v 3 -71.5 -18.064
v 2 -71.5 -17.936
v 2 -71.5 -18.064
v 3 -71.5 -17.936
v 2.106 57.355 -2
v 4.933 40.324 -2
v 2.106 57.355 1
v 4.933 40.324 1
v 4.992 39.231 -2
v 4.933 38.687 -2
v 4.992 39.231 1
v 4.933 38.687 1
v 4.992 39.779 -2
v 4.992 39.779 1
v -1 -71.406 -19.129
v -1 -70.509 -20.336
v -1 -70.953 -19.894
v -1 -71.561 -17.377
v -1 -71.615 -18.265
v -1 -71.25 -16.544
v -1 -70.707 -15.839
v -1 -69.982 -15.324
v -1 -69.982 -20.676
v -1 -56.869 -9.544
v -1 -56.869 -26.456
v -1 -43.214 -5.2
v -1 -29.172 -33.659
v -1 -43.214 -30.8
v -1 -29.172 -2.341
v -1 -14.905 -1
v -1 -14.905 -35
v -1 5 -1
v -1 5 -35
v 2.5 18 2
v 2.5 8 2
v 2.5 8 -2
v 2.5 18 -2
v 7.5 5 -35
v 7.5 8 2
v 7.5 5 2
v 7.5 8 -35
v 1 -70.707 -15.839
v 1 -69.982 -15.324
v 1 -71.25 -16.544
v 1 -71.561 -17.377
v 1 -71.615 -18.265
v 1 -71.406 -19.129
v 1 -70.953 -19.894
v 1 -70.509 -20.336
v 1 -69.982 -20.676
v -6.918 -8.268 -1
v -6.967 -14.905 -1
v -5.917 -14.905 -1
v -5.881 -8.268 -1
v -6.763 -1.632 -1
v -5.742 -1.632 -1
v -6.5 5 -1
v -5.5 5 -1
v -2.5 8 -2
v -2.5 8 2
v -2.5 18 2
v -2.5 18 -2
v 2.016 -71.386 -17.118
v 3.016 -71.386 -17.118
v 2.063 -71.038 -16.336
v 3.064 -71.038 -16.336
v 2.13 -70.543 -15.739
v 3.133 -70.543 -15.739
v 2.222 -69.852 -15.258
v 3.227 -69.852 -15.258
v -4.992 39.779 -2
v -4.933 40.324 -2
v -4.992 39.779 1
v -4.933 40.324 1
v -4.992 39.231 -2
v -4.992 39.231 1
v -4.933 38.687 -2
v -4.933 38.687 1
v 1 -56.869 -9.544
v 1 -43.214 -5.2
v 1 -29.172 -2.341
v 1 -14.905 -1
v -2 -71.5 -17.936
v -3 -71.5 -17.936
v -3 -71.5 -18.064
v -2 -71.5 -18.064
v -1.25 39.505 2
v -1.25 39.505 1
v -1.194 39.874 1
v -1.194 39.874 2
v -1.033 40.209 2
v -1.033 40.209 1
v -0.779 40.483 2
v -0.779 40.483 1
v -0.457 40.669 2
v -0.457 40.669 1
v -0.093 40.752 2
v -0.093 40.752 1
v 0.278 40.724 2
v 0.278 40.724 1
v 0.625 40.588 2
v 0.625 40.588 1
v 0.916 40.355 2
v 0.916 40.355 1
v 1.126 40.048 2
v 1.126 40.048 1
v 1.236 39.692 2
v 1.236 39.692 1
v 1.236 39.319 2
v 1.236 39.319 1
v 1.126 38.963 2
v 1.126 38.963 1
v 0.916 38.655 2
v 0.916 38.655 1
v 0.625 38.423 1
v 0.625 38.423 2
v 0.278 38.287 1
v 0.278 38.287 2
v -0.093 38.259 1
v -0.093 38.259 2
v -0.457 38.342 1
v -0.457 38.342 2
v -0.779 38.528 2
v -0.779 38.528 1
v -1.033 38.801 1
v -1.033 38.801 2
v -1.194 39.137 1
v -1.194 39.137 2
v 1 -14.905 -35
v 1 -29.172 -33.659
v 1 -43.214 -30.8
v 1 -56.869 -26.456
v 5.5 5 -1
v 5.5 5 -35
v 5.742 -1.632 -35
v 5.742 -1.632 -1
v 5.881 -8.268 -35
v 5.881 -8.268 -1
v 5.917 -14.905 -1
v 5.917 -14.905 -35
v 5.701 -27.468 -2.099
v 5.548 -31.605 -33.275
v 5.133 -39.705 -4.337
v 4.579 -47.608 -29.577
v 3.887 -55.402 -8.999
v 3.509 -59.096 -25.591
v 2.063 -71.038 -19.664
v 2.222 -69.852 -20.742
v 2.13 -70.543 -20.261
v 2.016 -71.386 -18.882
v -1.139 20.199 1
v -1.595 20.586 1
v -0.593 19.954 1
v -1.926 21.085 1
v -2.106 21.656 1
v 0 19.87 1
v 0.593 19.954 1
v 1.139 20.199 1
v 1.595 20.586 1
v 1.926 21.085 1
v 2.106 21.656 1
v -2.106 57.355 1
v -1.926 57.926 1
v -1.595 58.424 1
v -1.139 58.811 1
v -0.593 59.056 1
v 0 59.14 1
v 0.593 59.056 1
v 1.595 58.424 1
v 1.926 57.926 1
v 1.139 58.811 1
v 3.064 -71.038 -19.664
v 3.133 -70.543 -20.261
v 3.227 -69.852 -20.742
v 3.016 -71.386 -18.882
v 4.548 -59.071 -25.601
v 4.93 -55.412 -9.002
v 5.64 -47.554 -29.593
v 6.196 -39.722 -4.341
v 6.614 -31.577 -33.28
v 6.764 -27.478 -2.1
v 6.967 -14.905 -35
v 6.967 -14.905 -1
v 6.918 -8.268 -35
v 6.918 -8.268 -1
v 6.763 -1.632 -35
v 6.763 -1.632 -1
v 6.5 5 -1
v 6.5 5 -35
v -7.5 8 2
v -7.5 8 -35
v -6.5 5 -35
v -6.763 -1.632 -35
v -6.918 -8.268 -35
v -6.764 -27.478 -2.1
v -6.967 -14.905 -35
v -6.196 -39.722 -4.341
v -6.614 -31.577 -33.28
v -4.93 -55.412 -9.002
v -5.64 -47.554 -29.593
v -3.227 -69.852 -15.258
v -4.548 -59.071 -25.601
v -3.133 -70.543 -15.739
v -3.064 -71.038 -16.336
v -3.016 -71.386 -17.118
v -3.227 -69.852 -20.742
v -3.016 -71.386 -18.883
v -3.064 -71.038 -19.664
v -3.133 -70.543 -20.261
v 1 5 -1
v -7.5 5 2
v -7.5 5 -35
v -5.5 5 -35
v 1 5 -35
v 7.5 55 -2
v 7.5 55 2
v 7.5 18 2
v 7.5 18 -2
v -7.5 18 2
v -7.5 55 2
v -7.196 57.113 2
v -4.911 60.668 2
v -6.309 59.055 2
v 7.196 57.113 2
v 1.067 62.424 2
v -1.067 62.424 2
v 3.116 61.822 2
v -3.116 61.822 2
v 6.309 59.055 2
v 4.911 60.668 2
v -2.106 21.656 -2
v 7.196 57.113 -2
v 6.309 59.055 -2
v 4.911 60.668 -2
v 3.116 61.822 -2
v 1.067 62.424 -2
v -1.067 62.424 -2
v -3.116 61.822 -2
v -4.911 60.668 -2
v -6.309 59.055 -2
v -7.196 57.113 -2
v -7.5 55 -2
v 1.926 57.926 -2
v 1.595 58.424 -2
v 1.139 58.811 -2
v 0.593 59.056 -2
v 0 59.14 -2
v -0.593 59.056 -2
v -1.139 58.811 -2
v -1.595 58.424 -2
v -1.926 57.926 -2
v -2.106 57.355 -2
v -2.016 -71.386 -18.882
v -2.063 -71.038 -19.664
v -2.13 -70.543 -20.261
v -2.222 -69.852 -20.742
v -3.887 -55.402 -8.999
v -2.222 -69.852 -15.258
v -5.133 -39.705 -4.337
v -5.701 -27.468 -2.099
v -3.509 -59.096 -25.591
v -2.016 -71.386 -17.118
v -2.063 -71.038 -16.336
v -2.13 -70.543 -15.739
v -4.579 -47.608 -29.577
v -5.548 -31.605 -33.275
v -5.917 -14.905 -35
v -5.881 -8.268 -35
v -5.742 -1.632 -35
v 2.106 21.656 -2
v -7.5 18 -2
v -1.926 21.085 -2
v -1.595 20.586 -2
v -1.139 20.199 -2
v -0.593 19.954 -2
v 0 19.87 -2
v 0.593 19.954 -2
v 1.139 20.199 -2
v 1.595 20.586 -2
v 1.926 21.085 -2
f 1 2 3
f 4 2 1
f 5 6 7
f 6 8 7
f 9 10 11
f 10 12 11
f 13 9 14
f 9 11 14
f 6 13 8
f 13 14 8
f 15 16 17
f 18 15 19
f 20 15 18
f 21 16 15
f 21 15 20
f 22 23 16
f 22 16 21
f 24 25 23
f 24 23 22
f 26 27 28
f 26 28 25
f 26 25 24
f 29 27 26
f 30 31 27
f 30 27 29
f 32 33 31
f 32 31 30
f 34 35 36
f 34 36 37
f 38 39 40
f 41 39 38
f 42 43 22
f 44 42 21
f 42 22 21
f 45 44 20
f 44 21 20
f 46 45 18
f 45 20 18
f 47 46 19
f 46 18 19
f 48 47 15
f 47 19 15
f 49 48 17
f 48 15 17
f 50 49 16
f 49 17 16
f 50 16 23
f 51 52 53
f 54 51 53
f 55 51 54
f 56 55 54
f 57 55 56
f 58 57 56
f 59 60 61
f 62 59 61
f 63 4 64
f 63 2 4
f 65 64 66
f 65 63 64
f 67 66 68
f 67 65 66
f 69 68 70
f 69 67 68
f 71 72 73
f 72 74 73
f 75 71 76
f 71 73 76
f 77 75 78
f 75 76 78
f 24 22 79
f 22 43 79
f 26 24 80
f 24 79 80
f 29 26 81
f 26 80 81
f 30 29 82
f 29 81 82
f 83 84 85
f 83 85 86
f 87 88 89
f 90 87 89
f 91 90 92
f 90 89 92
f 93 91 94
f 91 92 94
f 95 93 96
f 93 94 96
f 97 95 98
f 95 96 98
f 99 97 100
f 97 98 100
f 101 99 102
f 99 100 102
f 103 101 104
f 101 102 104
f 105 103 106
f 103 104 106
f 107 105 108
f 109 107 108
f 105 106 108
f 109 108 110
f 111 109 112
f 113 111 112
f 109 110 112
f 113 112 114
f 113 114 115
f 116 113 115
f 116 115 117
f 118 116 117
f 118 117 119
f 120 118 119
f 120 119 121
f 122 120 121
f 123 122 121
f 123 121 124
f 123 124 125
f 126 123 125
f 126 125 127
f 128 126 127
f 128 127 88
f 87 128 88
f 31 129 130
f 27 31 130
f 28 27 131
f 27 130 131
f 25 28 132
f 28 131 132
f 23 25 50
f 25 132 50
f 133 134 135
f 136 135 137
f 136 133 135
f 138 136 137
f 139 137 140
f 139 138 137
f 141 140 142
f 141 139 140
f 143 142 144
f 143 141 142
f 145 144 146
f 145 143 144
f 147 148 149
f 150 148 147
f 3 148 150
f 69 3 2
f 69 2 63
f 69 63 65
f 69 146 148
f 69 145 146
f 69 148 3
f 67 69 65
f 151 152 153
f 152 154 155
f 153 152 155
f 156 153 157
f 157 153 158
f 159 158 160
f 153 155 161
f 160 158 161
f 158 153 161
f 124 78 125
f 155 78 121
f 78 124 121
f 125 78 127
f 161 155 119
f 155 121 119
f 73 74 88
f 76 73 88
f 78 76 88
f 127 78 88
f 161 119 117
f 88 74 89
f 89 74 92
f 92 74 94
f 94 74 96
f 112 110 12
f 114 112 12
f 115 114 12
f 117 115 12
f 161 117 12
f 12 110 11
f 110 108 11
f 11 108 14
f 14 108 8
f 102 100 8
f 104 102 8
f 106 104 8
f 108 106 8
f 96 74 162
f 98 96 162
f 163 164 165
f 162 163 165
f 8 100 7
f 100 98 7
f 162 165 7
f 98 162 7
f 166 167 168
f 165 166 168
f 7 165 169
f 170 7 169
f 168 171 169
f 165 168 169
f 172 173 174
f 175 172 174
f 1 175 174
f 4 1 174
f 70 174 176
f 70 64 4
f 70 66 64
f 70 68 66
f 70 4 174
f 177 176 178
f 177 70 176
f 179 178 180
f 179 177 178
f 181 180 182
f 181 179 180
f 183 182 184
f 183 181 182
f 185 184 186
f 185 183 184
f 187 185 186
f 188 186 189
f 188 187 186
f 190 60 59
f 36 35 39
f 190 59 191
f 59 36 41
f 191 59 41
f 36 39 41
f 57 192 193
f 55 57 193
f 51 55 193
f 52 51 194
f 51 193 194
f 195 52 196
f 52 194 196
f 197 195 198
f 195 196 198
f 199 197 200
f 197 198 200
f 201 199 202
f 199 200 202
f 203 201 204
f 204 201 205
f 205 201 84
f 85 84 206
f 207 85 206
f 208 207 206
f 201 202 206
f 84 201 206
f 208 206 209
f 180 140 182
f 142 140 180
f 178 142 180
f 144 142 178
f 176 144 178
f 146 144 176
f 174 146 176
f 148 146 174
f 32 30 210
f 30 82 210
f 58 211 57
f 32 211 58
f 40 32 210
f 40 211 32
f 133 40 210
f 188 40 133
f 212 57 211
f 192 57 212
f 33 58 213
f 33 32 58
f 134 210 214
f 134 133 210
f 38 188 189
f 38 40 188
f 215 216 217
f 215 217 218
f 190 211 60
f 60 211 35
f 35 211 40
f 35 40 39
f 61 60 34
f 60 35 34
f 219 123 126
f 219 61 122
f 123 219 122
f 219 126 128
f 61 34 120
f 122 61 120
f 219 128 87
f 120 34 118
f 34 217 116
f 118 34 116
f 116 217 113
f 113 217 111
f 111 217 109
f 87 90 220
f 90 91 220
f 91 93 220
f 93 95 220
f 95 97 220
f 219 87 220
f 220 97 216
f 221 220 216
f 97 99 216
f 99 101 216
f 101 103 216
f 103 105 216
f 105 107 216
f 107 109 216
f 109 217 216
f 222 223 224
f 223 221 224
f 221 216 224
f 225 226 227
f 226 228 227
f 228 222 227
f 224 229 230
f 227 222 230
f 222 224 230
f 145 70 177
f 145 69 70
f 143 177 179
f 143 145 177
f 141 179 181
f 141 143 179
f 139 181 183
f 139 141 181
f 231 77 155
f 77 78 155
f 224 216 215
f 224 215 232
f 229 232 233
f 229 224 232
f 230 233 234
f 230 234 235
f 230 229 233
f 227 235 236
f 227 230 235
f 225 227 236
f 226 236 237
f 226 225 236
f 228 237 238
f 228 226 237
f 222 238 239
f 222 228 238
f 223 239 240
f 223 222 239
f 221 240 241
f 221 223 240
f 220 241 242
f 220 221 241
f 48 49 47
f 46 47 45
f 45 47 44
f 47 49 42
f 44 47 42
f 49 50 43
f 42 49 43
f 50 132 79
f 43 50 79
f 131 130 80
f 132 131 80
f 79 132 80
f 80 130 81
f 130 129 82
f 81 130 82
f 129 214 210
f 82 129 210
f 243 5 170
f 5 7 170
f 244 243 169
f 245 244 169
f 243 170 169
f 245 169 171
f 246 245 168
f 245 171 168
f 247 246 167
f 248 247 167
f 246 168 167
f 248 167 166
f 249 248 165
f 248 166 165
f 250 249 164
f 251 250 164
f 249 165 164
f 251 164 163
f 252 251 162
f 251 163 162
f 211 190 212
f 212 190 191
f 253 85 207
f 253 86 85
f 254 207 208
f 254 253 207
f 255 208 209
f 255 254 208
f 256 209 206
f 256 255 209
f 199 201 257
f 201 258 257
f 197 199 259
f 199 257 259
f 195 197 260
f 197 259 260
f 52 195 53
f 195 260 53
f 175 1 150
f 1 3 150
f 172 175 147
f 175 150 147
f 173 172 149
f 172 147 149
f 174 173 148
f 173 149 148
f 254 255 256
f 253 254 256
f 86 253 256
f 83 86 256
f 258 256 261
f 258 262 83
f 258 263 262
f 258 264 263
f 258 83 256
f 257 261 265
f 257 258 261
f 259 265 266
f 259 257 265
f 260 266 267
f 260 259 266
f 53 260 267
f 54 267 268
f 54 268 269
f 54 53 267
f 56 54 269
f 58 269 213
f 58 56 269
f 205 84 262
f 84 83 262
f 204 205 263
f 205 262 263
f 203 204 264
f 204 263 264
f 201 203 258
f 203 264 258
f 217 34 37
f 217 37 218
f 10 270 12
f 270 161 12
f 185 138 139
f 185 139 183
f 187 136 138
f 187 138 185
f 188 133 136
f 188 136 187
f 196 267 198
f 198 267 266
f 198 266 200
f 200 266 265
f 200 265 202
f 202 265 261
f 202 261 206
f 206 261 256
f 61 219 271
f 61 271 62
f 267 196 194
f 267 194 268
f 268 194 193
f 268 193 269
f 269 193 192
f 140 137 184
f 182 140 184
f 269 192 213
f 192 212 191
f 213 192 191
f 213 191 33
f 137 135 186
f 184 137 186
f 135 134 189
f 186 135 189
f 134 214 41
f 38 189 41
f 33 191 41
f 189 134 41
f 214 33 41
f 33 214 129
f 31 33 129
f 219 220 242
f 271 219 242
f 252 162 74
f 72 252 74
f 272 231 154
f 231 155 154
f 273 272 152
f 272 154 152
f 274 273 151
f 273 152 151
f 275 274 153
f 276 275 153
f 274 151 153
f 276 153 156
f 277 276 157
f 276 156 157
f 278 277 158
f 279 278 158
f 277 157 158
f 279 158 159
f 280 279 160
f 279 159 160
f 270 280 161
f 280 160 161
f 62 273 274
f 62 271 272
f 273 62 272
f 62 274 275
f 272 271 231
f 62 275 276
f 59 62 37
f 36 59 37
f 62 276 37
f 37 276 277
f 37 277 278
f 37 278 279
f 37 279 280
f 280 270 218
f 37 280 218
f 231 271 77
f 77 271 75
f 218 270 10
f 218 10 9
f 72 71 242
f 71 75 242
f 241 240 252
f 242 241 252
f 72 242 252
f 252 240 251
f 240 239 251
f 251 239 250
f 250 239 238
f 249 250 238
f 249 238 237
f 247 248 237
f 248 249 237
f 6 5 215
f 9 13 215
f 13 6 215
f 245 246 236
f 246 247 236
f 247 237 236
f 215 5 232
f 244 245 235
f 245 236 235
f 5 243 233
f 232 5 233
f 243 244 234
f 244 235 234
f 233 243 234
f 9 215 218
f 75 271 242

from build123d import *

# Parameters (mm, degrees)
EXTRUDE_1_DEPTH          = 2
EXTRUDE_1_DEPTH_BACK     = 2
EXTRUDE_2_DEPTH          = 7.5
EXTRUDE_2_DEPTH_BACK     = 7.5
SKETCH_6_W               = 37
SKETCH_6_H               = 3
EXTRUDE_4_DEPTH          = 1
EXTRUDE_4_DEPTH_BACK     = 1
FILLET_1_R               = 3
EXTRUDE_8_DEPTH          = 17
EXTRUDE_8_DEPTH_BACK     = 17
CUT_EXTRUDE_3_DEPTH      = 17.5
CUT_EXTRUDE_3_DEPTH_BACK = 17.5
FILLET_7_R               = 3
FILLET_8_R               = 3
FILLET_9_R               = 3
FILLET_10_R              = 3
SKETCH_21_W              = 5
SKETCH_21_H              = 10
CUT_EXTRUDE_4_DEPTH      = 4
CUT_EXTRUDE_5_DEPTH      = 1
CUT_EXTRUDE_5_DEPTH_BACK = 2
SKETCH_23_R              = 1.25
CUT_EXTRUDE_6_DEPTH      = 13


with BuildPart() as part:
    # 草圖1 → 填料-伸長1 (new, two sides: drawn at the far end of the back side and taken through both)
    with BuildSketch(Plane.XY.offset(-EXTRUDE_1_DEPTH_BACK)):
        with BuildLine():
            Line((7.5, 8), (7.5, 55))
            ThreePointArc((7.5, 55), (0, 62.5), (-7.5, 55))
            Line((-7.5, 55), (-7.5, 8))
            Line((-7.5, 8), (7.5, 8))
        make_face()
    extrude(amount=EXTRUDE_1_DEPTH + EXTRUDE_1_DEPTH_BACK)

    # 草圖6 → 填料-伸長2 (add, two sides: drawn at the far end of the back side and taken through both)
    with BuildSketch(Plane(origin=(0, 0, 0), x_dir=(0, 0, -1), z_dir=(1, 0, 0)).offset(-EXTRUDE_2_DEPTH_BACK)):
        with Locations((16.5, 6.5)):
            Rectangle(SKETCH_6_W, SKETCH_6_H)
    extrude(amount=EXTRUDE_2_DEPTH + EXTRUDE_2_DEPTH_BACK)

    # 草圖8 → 填料-伸長4 (add, two sides: drawn at the far end of the back side and taken through both)
    with BuildSketch(Plane(origin=(0, 0, 0), x_dir=(0, 0, -1), z_dir=(1, 0, 0)).offset(-EXTRUDE_4_DEPTH_BACK)):
        with BuildLine():
            Line((1, 5), (35, 5))
            Line((35, 5), (35, -14.904717451))
            ThreePointArc((35, -14.904717451), (30.055498448, -45.958152709), (18, -75))
            ThreePointArc((18, -75), (5.944501552, -45.958152709), (1, -14.904717451))
            Line((1, -14.904717451), (1, 5))
        make_face()
    extrude(amount=EXTRUDE_4_DEPTH + EXTRUDE_4_DEPTH_BACK)

    # 圓角1
    fillet_1_edges = [part.edges().sort_by_distance(p)[0] for p in [
        (0, -75, -18),
    ]]
    fillet(fillet_1_edges, radius=FILLET_1_R)

    # 草圖19 → 填料-伸長8 (add, two sides: drawn at the far end of the back side and taken through both)
    with BuildSketch(Plane.XY.offset(-18).offset(-EXTRUDE_8_DEPTH_BACK)):
        with BuildLine():
            Line((6.5, 5), (5.5, 5))
            ThreePointArc((5.5, 5), (5.47282517, -33.328822067), (2, -71.5))
            Line((2, -71.5), (3, -71.5))
            ThreePointArc((3, -71.5), (6.537897336, -33.331799225), (6.5, 5))
        make_face()
        with BuildLine():
            Line((-3, -71.5), (-2, -71.5))
            ThreePointArc((-2, -71.5), (-5.47282517, -33.328822067), (-5.5, 5))
            Line((-5.5, 5), (-6.5, 5))
            ThreePointArc((-6.5, 5), (-6.537897336, -33.331799225), (-3, -71.5))
        make_face()
    extrude(amount=EXTRUDE_8_DEPTH + EXTRUDE_8_DEPTH_BACK)

    # 草圖20 → 除料-伸長3 (cut, two sides: drawn at the far end of the back side and taken through both)
    with BuildSketch(Plane(origin=(0, 0, 0), x_dir=(0, 0, -1), z_dir=(1, 0, 0)).offset(-CUT_EXTRUDE_3_DEPTH_BACK)):
        with BuildLine():
            Line((1, -14.904717451), (1, -76.940462962))
            Line((1, -76.940462962), (35, -76.940462962))
            Line((35, -76.940462962), (35, -14.904717451))
            ThreePointArc((35, -14.904717451), (30.055498448, -45.958152709), (18, -75))
            ThreePointArc((18, -75), (5.944501552, -45.958152709), (1, -14.904717451))
        make_face()
    extrude(amount=CUT_EXTRUDE_3_DEPTH + CUT_EXTRUDE_3_DEPTH_BACK, mode=Mode.SUBTRACT)

    # 圓角7
    fillet_7_edges = [part.edges().sort_by_distance(p)[0] for p in [
        (2.5, -71.5, -16.104414556),
    ]]
    fillet(fillet_7_edges, radius=FILLET_7_R)

    # 圓角8
    fillet_8_edges = [part.edges().sort_by_distance(p)[0] for p in [
        (2.5, -71.5, -19.895585444),
    ]]
    fillet(fillet_8_edges, radius=FILLET_8_R)

    # 圓角9
    fillet_9_edges = [part.edges().sort_by_distance(p)[0] for p in [
        (-2.5, -71.5, -16.104414556),
    ]]
    fillet(fillet_9_edges, radius=FILLET_9_R)

    # 圓角10
    fillet_10_edges = [part.edges().sort_by_distance(p)[0] for p in [
        (-2.5, -71.5, -19.895585444),
    ]]
    fillet(fillet_10_edges, radius=FILLET_10_R)

    # 草圖21 → 除料-伸長4 (cut)
    with BuildSketch(Plane.XY.offset(2)):
        with Locations((-5, 13)):
            Rectangle(SKETCH_21_W, SKETCH_21_H)
        with Locations((5, 13)):
            Rectangle(SKETCH_21_W, SKETCH_21_H)
    extrude(amount=-CUT_EXTRUDE_4_DEPTH, mode=Mode.SUBTRACT)

    # 草圖3 → 除料-伸長5 (cut, two sides: drawn at the far end of the back side and taken through both)
    with BuildSketch(Plane.XY.offset(-CUT_EXTRUDE_5_DEPTH_BACK)):
        with BuildLine():
            Line((-2.106194146, 57.35480611), (-4.932538983, 40.323847539))
            ThreePointArc((-4.932538983, 40.323847539), (-5, 39.50527611), (-4.932538983, 38.686704682))
            Line((-4.932538983, 38.686704682), (-2.106194146, 21.65574611))
            ThreePointArc((-2.106194146, 21.65574611), (0, 19.87027611), (2.106194146, 21.65574611))
            Line((2.106194146, 21.65574611), (4.932538983, 38.686704682))
            ThreePointArc((4.932538983, 38.686704682), (5, 39.50527611), (4.932538983, 40.323847539))
            Line((4.932538983, 40.323847539), (2.106194146, 57.35480611))
            ThreePointArc((2.106194146, 57.35480611), (0, 59.14027611), (-2.106194146, 57.35480611))
        make_face()
    extrude(amount=CUT_EXTRUDE_5_DEPTH + CUT_EXTRUDE_5_DEPTH_BACK, mode=Mode.SUBTRACT)

    # 草圖23 → 除料-伸長6 (cut)
    with BuildSketch(Plane(origin=(0, 0, -2), x_dir=(-1, 0, 0), z_dir=(0, 0, -1))):
        with Locations((0, 39.50527611)):
            Circle(SKETCH_23_R)
    extrude(amount=-CUT_EXTRUDE_6_DEPTH, mode=Mode.SUBTRACT)


solid = part.part
